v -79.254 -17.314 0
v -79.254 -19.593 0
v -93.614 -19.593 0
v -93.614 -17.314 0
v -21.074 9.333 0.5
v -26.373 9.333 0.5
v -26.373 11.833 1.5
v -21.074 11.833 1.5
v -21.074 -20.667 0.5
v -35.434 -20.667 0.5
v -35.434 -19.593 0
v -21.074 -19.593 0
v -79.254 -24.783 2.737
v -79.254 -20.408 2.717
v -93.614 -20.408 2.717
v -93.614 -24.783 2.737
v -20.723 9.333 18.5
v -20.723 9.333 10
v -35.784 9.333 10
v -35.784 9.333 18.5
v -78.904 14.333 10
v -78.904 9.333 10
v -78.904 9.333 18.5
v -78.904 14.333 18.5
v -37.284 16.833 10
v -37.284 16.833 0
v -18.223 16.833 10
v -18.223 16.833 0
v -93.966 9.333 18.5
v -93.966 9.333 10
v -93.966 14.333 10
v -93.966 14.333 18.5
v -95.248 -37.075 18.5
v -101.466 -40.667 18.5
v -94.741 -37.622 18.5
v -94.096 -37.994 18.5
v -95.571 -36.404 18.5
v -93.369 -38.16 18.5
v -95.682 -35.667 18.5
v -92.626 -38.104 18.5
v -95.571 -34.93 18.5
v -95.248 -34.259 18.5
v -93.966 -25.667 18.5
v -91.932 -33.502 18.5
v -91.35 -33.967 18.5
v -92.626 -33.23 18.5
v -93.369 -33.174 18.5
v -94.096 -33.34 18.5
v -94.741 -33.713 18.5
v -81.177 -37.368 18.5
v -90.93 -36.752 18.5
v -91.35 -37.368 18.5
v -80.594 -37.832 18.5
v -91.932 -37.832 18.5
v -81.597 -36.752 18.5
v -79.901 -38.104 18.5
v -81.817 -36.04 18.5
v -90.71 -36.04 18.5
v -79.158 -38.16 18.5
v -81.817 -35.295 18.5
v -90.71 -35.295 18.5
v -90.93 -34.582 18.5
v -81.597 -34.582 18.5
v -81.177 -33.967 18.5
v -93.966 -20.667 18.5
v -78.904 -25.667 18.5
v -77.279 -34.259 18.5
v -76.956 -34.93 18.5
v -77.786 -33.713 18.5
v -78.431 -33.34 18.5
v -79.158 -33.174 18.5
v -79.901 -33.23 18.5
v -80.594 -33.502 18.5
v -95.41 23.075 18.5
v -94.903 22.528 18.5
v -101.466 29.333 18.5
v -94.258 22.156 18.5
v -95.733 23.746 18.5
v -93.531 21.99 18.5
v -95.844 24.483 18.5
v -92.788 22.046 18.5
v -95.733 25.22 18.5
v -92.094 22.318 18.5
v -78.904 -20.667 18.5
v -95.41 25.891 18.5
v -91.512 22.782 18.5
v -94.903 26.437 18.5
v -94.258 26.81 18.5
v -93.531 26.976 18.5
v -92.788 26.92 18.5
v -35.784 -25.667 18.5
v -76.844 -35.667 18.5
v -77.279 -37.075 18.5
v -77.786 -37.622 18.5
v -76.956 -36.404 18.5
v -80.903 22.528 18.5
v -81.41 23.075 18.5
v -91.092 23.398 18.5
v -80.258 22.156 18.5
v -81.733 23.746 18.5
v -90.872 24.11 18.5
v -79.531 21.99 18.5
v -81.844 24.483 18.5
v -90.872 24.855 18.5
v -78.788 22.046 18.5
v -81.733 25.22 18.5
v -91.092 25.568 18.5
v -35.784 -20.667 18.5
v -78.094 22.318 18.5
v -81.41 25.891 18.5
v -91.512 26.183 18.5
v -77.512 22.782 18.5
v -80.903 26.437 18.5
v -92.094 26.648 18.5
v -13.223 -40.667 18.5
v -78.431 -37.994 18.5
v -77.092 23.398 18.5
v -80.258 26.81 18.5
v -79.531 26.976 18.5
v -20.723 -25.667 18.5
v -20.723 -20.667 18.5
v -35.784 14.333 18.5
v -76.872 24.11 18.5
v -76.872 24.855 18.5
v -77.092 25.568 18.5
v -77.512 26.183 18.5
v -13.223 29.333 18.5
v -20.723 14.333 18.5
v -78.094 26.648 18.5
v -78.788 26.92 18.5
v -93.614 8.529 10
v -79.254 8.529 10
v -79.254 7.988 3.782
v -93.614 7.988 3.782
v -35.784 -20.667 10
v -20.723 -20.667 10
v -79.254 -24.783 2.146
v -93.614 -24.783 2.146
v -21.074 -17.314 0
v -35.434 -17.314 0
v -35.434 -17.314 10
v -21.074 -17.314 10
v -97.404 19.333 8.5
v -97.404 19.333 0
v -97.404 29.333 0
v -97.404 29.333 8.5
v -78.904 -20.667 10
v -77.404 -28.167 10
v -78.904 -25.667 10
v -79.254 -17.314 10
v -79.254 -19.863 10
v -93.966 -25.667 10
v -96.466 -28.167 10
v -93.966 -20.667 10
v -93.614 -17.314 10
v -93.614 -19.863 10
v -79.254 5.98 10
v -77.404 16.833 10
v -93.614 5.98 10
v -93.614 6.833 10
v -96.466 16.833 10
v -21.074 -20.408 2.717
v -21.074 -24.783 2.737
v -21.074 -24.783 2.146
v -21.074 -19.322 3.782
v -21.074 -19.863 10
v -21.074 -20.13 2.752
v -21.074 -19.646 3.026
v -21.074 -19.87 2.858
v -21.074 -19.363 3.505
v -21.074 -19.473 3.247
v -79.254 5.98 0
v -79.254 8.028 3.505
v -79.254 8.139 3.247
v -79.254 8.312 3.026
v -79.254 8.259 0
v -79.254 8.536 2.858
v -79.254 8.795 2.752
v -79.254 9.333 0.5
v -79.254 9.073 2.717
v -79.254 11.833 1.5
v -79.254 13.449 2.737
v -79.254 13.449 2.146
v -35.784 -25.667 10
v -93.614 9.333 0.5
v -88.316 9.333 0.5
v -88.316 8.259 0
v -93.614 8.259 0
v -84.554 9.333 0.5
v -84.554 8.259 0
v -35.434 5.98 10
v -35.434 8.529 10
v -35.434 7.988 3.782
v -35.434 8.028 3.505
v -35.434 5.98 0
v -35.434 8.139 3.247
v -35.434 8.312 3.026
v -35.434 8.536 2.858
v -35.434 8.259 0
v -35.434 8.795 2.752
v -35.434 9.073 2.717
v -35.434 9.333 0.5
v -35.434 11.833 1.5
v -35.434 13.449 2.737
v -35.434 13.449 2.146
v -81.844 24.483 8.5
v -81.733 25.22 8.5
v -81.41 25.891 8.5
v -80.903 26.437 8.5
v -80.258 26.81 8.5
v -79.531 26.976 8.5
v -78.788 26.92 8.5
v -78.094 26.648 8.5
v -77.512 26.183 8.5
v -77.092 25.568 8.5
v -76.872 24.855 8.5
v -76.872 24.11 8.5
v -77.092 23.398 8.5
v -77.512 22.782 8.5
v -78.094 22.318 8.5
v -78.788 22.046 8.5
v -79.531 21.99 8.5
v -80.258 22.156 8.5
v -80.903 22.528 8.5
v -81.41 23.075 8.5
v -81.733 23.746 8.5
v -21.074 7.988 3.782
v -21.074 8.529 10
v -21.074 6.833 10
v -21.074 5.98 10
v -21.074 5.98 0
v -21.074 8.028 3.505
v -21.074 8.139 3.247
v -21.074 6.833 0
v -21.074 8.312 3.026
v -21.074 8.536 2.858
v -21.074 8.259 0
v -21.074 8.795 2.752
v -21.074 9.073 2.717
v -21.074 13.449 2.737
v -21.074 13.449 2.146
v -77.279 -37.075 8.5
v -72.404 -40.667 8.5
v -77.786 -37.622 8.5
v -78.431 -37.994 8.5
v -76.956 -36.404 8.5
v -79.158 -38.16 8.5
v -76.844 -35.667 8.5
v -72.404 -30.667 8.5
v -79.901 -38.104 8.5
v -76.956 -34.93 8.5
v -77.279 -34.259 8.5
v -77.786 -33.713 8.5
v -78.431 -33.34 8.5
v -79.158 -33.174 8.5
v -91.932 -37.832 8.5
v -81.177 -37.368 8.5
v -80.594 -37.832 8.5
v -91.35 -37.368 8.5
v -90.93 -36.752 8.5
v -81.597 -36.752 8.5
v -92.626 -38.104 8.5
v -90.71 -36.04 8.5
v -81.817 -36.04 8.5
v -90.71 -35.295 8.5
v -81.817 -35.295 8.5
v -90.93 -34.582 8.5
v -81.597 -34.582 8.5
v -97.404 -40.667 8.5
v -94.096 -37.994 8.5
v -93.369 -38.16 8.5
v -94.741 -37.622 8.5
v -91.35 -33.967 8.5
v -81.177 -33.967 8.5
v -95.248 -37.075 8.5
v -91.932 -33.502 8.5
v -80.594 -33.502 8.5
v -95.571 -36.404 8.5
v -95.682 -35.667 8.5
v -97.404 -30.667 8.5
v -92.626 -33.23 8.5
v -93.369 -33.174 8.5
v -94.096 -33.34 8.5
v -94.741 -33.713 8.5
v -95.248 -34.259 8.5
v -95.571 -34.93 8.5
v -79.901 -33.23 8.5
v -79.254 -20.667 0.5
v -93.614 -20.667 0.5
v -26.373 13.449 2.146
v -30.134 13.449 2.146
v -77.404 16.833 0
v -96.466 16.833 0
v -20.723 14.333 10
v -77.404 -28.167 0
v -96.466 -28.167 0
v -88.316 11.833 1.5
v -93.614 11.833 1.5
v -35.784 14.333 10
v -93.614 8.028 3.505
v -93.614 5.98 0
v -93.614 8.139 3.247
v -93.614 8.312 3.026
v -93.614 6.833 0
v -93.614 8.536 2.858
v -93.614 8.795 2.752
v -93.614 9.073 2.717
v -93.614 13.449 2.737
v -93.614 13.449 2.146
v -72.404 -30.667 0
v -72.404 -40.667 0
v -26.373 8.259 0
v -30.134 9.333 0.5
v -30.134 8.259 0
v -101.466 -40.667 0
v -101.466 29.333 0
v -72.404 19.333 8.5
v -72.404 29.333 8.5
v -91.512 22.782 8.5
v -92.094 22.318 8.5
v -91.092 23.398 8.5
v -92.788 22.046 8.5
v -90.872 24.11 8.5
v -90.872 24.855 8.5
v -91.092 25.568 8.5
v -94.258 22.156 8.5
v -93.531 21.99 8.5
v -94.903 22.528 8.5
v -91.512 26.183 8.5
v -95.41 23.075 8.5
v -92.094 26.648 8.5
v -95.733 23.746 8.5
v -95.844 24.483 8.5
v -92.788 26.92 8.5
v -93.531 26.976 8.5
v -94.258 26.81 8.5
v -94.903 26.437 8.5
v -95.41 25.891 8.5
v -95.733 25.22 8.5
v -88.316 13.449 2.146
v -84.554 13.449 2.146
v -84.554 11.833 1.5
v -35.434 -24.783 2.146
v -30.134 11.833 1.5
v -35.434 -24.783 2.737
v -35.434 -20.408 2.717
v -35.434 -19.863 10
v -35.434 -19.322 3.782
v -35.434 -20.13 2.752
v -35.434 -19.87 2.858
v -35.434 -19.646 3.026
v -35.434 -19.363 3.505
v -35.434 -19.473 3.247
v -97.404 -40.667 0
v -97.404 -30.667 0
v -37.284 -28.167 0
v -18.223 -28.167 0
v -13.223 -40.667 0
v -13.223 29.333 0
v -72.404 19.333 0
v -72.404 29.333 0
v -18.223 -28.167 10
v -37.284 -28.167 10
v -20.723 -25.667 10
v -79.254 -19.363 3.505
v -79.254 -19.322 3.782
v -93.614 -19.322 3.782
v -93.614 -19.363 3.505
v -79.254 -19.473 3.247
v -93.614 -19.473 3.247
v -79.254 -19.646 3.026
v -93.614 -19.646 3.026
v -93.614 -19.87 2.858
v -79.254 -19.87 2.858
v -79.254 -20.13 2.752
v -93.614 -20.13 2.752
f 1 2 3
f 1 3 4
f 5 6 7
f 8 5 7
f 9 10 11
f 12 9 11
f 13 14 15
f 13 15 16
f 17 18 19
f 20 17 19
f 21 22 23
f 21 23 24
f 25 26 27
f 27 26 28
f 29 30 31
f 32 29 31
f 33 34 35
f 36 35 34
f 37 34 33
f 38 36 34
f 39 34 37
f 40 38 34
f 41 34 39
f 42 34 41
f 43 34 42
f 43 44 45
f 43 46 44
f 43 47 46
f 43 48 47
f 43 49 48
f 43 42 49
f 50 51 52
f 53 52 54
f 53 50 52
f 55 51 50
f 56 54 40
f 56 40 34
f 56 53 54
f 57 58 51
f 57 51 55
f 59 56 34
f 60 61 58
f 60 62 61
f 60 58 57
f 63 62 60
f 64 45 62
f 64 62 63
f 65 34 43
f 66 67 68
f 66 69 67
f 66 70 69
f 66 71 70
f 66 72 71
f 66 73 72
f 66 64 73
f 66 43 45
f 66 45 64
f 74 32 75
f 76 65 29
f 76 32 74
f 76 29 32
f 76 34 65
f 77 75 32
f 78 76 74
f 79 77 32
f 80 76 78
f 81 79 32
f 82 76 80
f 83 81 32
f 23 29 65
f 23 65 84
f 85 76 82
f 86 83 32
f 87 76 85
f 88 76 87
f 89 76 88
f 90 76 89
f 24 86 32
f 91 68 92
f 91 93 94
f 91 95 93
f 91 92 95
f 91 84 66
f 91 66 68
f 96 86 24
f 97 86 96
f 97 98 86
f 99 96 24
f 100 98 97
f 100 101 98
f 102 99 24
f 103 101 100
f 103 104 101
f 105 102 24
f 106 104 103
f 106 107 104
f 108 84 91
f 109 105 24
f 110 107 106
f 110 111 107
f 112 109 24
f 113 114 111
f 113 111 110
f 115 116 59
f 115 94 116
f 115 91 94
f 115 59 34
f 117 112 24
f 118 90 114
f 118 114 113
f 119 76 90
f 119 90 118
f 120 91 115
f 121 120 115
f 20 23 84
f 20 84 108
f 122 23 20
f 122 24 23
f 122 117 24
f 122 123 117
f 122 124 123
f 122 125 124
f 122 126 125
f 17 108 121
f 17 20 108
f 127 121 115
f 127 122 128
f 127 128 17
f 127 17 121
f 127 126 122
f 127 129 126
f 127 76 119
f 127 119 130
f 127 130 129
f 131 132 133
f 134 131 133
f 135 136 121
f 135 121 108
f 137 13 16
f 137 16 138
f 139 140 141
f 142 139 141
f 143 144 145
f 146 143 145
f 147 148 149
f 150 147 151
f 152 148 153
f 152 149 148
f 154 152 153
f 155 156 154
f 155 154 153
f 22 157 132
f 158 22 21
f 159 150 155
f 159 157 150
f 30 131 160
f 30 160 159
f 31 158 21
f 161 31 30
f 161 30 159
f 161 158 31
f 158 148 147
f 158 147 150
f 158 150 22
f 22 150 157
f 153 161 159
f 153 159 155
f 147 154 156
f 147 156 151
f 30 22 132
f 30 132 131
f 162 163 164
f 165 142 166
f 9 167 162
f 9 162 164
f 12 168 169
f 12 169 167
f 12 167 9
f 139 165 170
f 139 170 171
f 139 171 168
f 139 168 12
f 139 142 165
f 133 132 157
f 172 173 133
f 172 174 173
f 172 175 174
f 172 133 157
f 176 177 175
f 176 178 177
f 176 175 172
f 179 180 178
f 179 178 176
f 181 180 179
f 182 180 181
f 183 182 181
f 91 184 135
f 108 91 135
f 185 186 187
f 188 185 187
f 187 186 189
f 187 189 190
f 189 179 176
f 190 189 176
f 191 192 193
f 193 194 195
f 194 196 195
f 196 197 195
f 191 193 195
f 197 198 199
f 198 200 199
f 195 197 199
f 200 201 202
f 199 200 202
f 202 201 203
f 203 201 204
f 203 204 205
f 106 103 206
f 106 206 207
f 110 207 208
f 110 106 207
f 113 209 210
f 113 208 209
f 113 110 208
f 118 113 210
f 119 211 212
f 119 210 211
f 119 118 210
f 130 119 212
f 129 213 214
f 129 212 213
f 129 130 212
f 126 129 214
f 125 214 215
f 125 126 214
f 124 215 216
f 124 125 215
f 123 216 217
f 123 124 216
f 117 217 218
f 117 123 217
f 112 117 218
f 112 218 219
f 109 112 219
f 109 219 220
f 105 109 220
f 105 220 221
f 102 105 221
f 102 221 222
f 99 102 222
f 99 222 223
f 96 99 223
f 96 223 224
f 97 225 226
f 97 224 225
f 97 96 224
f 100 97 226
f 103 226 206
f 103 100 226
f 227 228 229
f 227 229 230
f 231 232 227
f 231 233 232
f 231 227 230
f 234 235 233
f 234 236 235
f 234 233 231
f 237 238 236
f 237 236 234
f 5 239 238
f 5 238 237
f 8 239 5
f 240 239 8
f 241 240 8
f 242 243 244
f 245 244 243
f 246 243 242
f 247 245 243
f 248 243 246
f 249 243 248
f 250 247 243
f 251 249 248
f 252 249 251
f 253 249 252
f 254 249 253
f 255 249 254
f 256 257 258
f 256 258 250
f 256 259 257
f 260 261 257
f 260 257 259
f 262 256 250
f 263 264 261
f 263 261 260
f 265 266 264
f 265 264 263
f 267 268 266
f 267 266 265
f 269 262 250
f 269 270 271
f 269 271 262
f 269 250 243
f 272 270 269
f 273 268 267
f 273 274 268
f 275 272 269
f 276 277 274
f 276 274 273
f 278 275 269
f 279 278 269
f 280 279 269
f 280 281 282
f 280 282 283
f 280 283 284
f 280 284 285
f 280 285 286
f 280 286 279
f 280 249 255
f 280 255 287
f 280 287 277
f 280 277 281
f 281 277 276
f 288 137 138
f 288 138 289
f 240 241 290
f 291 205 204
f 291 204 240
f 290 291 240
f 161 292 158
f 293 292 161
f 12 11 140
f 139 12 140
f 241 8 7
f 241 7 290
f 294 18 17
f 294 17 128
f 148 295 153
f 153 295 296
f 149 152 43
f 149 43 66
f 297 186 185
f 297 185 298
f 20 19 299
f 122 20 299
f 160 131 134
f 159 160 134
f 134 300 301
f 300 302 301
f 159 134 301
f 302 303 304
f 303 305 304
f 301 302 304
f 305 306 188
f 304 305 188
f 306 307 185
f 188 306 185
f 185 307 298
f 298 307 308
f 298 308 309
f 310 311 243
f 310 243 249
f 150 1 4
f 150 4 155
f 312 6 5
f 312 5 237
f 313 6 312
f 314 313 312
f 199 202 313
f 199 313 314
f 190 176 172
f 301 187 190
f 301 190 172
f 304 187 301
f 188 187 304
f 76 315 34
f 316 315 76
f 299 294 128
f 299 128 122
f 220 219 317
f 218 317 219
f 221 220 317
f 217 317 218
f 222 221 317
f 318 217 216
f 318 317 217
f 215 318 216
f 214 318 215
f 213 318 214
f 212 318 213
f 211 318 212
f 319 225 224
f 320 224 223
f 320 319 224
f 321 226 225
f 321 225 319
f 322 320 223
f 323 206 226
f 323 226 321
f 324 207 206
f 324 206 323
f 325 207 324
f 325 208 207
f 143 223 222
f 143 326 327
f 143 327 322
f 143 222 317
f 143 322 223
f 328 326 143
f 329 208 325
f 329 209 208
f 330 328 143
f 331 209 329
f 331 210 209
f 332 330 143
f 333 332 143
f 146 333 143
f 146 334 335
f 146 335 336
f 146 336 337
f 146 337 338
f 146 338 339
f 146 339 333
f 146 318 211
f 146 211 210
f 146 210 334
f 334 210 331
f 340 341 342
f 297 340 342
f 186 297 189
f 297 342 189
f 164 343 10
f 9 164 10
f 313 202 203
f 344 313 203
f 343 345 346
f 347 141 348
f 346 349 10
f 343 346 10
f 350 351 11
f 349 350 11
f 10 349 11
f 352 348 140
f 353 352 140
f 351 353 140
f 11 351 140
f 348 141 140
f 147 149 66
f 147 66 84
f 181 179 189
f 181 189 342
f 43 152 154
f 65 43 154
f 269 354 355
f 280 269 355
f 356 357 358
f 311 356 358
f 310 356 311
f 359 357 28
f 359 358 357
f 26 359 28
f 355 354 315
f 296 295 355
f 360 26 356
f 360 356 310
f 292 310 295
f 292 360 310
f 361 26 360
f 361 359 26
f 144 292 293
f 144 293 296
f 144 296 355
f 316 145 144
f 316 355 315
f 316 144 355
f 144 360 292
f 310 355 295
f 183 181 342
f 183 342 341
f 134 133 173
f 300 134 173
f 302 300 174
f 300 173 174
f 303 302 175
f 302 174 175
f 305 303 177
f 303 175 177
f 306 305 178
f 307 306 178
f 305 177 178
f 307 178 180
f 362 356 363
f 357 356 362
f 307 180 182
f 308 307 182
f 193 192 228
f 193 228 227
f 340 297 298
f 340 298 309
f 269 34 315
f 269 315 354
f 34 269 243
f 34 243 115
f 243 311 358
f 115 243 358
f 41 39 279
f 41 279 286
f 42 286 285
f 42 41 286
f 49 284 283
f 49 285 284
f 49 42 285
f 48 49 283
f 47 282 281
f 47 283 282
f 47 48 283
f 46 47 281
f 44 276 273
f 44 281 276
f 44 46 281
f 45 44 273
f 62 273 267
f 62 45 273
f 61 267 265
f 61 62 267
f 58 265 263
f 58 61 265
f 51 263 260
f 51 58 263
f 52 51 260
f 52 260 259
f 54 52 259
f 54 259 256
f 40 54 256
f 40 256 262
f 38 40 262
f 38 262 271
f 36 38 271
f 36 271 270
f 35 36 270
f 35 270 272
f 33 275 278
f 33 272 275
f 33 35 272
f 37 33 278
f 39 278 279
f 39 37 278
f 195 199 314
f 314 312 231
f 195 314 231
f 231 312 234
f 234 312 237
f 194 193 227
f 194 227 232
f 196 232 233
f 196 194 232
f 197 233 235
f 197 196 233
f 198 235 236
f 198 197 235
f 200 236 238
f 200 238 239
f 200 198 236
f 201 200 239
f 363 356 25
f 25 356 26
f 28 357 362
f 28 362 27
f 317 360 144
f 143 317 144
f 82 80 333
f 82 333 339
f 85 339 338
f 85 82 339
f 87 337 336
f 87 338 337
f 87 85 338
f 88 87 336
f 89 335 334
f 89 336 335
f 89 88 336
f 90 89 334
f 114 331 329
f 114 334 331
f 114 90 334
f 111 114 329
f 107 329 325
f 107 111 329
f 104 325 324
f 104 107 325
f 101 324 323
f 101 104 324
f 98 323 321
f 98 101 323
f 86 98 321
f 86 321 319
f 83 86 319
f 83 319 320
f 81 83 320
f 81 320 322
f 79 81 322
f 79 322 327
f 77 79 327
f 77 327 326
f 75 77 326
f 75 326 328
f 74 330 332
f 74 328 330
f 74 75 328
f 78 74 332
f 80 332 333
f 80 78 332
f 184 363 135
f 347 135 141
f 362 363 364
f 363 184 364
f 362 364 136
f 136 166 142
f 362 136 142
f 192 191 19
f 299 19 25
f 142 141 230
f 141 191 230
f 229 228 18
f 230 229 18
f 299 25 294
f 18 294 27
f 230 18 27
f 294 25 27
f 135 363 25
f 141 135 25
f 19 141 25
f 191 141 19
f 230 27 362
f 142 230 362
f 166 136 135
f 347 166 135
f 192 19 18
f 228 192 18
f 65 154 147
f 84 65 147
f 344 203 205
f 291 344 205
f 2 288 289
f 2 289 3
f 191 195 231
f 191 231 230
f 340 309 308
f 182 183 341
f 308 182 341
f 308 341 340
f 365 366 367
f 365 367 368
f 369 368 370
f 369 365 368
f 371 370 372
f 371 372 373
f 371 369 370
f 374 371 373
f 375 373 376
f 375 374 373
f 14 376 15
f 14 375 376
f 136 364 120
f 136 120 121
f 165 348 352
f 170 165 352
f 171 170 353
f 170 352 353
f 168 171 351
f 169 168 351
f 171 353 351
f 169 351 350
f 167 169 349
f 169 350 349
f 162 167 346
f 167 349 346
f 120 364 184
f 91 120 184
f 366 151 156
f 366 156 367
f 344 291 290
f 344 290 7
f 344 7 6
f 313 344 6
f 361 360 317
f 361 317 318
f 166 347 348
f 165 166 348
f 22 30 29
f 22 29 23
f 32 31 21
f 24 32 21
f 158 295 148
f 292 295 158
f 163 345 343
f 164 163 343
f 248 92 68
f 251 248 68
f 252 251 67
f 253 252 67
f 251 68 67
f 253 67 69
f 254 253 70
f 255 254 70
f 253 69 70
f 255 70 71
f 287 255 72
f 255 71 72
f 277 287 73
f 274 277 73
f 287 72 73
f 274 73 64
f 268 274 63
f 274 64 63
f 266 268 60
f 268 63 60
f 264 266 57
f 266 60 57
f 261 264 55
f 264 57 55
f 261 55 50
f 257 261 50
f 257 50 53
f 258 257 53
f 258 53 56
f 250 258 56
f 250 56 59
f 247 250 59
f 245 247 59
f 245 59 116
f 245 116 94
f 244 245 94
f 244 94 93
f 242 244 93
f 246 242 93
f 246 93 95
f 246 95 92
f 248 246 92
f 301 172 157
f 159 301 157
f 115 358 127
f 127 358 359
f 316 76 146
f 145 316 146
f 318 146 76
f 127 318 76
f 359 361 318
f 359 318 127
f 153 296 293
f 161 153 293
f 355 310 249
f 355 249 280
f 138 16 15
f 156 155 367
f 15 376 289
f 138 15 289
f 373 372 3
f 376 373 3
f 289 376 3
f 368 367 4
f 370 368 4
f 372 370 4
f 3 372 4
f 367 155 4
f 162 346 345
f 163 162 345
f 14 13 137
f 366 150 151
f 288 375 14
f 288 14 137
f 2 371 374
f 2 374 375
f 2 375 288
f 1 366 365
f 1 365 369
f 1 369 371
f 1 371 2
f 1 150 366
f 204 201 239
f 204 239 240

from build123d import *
from build123d.topology import SkipClean

# Parameters (mm, degrees)
SKETCH1_W                = 90
SKETCH1_H                = 70
SKETCH1_W_2              = 20.06126988
SKETCH1_H_2              = 45
SKETCH1_W_3              = 19.93873012
BOSS_EXTRUDE2_DEPTH      = 10
SKETCH1_W_4              = 15.06126988
SKETCH1_H_3              = 40
BOSS_EXTRUDE2_2_DEPTH    = 10
SKETCH1_W_5              = 14.93873012
BOSS_EXTRUDE2_3_DEPTH    = 10
SKETCH2_W                = 90
SKETCH2_H                = 70
BOSS_EXTRUDE3_DEPTH      = 10
SKETCH4_W                = 1.5
SKETCH4_H                = 70
CUT_EXTRUDE2_DEPTH       = 100.5
SKETCH10_W               = 5
SKETCH10_H               = 70
CUT_EXTRUDE4_DEPTH       = 100.5
SKETCH11_W               = 6.5
SKETCH11_H               = 5
CUT_EXTRUDE5_DEPTH       = 100.5
SKETCH12_W               = 18.5
SKETCH12_H               = 70
BOSS_EXTRUDE5_DEPTH      = 5
SKETCH13_W               = 18.5
SKETCH13_H               = 70
BOSS_EXTRUDE6_DEPTH      = 5
SKETCH14_W               = 40
SKETCH14_H               = 45
BOSS_EXTRUDE7_DEPTH      = 11
SKETCH15_R               = 2.5
CUT_EXTRUDE6_DEPTH       = 3
SKETCH16_W               = 30
SKETCH16_H               = 66
CUT_EXTRUDE8_DEPTH       = 15.5
SKETCH17_W               = 14.93873012
SKETCH17_H               = 15
SKETCH17_W_2             = 15.06126988
CUT_EXTRUDE10_DEPTH      = 10
SKETCH18_W               = 14.93873012
SKETCH18_H               = 5
SKETCH18_W_2             = 15.06126988
CUT_EXTRUDE11_DEPTH      = 10
CUT_EXTRUDE12_DEPTH      = 10
SKETCH23_W               = 14.93873012
SKETCH23_H               = 40
SKETCH23_W_2             = 5.3
SKETCH23_H_2             = 39
SKETCH23_W_3             = 2.93873012
SKETCH23_W_4             = 3.06126988
CUT_EXTRUDE14_DEPTH      = 10
SKETCH28_W               = 18.5
SKETCH28_H               = 44.033892013
CUT_EXTRUDE15_DEPTH      = 6
CUT_EXTRUDE16_DEPTH      = 75
SKETCH30_W               = 18.5
SKETCH30_H               = 44.033892013
BOSS_EXTRUDE9_DEPTH      = 6
SKETCH31_W               = 1
SKETCH31_H               = 1.413045359
BOSS_EXTRUDE10_DEPTH     = 11
SKETCH32_W               = 8.246560308
SKETCH32_H               = 43.371701703
BOSS_EXTRUDE11_DEPTH     = 5
SKETCH33_W               = 8.811569605
SKETCH33_H               = 37.919451222
BOSS_EXTRUDE12_DEPTH     = 5
SKETCH34_W               = 59.93873012
SKETCH34_H               = 70
CUT_EXTRUDE18_DEPTH      = 37
SKETCH35_W               = 14.36126988
SKETCH35_H               = 2
CUT_EXTRUDE20_DEPTH      = 7
SKETCH36_W               = 5.3
SKETCH36_H               = 2
CUT_EXTRUDE21_DEPTH      = 10
SKETCH37_W               = 14.36126988
SKETCH37_H               = 1.5
CUT_EXTRUDE22_DEPTH      = 10
SKETCH38_W               = 1.5
SKETCH38_H               = 4
CUT_EXTRUDE23_DEPTH      = 15
CUT_EXTRUDE24_DEPTH      = 10
CUT_EXTRUDE24_DEPTH_BACK = 6
SKETCH39_W               = 1.5
SKETCH39_H               = 2
CUT_EXTRUDE26_DEPTH      = 10
CUT_EXTRUDE26_DEPTH_BACK = 6
SKETCH41_W               = 16.397713906
SKETCH41_H               = 51.423830598
CUT_EXTRUDE27_DEPTH      = 5
BOSS_EXTRUDE13_DEPTH     = 14.37
FILLET4_R                = 1
BOSS_EXTRUDE14_DEPTH     = 14.37
FILLET5_R                = 1
CUT_EXTRUDE28_DEPTH      = 14.37
SKETCH45_W               = 14.36126988
SKETCH45_H               = 1
CUT_EXTRUDE29_DEPTH      = 14.37
SKETCH46_W               = 5
SKETCH46_H               = 51.423830598
BOSS_EXTRUDE15_DEPTH     = 18.37
SKETCH48_W               = 15.404975863
SKETCH48_H               = 48.247068862
CUT_EXTRUDE30_DEPTH      = 6
BOSS_EXTRUDE19_DEPTH     = 14.36
CUT_EXTRUDE33_DEPTH      = 15.36
CUT_EXTRUDE34_DEPTH      = 15.36
SKETCH56_W               = 3.76126988
SKETCH56_H               = 3.574209709
CUT_EXTRUDE35_DEPTH      = 5.36
BOSS_EXTRUDE23_DEPTH     = 14.36
CUT_EXTRUDE39_DEPTH      = 14.36
SKETCH61_W               = 0.148623377
SKETCH61_H               = 7.599329431
CUT_EXTRUDE41_DEPTH      = 10
CUT_EXTRUDE42_DEPTH      = 16
BOSS_EXTRUDE24_DEPTH     = 14.36
SKETCH68_W               = 15.06
SKETCH68_H               = 70
BOSS_EXTRUDE28_DEPTH     = 18.5
SKETCH70_W               = 6
SKETCH70_H               = 48.247068862
BOSS_EXTRUDE29_DEPTH     = 18.5
SKETCH72_W               = 16.06
SKETCH72_H               = 66
CUT_EXTRUDE44_DEPTH      = 16.5
SKETCH75_W               = 1
SKETCH75_H               = 70
CUT_EXTRUDE45_DEPTH      = 33.5
SKETCH76_R               = 2.5
CUT_EXTRUDE46_DEPTH      = 33.5
CUT_EXTRUDE48_DEPTH      = 26
CUT_EXTRUDE48_DEPTH_BACK = 23
SKETCH77_R               = 2.5
SKETCH78_W               = 22.535153564
SKETCH78_H               = 70
BOSS_EXTRUDE30_DEPTH     = 2
SKETCH79_W               = 35.12
SKETCH79_H               = 45
BOSS_EXTRUDE31_DEPTH     = 16.5
SKETCH80_W               = 6
SKETCH80_H               = 45
CUT_EXTRUDE49_DEPTH      = 16.5
SKETCH81_W               = 30.12
SKETCH81_H               = 66
BOSS_EXTRUDE33_DEPTH     = 16.5
SKETCH83_W               = 25
SKETCH83_H               = 10
CUT_EXTRUDE50_DEPTH      = 8.5
SKETCH84_R               = 2.5
CUT_EXTRUDE51_DEPTH      = 18.5


with BuildPart() as part:
    # Sketch1 → Boss-Extrude2 (new body)
    with BuildSketch(Plane.XY):
        with Locations((1.715542522, -5.667155425)):
            Rectangle(SKETCH1_W, SKETCH1_H)
        with Locations((-28.253822538, -5.667155425)):
            Rectangle(SKETCH1_W_2, SKETCH1_H_2, mode=Mode.SUBTRACT)
        with Locations((31.746177462, -5.667155425)):
            Rectangle(SKETCH1_W_3, SKETCH1_H_2, mode=Mode.SUBTRACT)
    extrude(amount=BOSS_EXTRUDE2_DEPTH)



with BuildPart() as body_2:
    # Sketch1 → Boss-Extrude2 2 (new body)
    with BuildSketch(Plane.XY):
        with Locations((-28.253822538, -5.667155425)):
            Rectangle(SKETCH1_W_4, SKETCH1_H_3)
    extrude(amount=BOSS_EXTRUDE2_2_DEPTH)


with BuildPart() as body_3:
    # Sketch1 → Boss-Extrude2 3 (new body)
    with BuildSketch(Plane.XY):
        with Locations((31.746177462, -5.667155425)):
            Rectangle(SKETCH1_W_5, SKETCH1_H_3)
    extrude(amount=BOSS_EXTRUDE2_3_DEPTH)


with BuildPart() as part_1:
    add(part.part)

    add(body_2.part)  # Boss-Extrude3 merges body 2

    add(body_3.part)  # Boss-Extrude3 merges body 3
    # Sketch2 → Boss-Extrude3 (add)
    with BuildSketch(Plane.XY.offset(10)):
        with Locations((1.715542522, -5.667155425)):
            Rectangle(SKETCH2_W, SKETCH2_H)
    extrude(amount=BOSS_EXTRUDE3_DEPTH)

    # Sketch4 → Cut-Extrude2 (cut)
    with BuildSketch(Plane.ZY.offset(43.284457478)):
        with Locations((19.25, -5.667155425)):
            Rectangle(SKETCH4_W, SKETCH4_H)
    extrude(amount=-CUT_EXTRUDE2_DEPTH, mode=Mode.SUBTRACT)

    # Sketch10 → Cut-Extrude4 (cut)
    with BuildSketch(Plane(origin=(0, 0, 0), x_dir=(-1, 0, 0), z_dir=(0, 0, -1))):
        with Locations((40.784457478, -5.667155425)):
            Rectangle(SKETCH10_W, SKETCH10_H)
        with Locations((-44.215542522, -5.667155425)):
            Rectangle(SKETCH10_W, SKETCH10_H)
    extrude(amount=-CUT_EXTRUDE4_DEPTH, mode=Mode.SUBTRACT)

    # Sketch11 → Cut-Extrude5 (cut)
    with BuildSketch(Plane.ZY.offset(35.784457478)):
        with Locations((6.75, 11.832844575)):
            Rectangle(SKETCH11_W, SKETCH11_H)
        Polygon((0, 9.332844575), (2, 14.332844575), (0, 14.332844575), align=None)
        Polygon((2, -25.667155425), (0, -20.667155425), (0, -25.667155425), align=None)
        with Locations((6.75, -23.167155425)):
            Rectangle(SKETCH11_W, SKETCH11_H)
    extrude(amount=-CUT_EXTRUDE5_DEPTH, mode=Mode.SUBTRACT)

    # Sketch12 → Boss-Extrude5 (add)
    with BuildSketch(Plane(origin=(41.715542522, 0, 0), x_dir=(0, 0, -1), z_dir=(1, 0, 0))):
        with Locations((-9.25, -5.667155425)):
            Rectangle(SKETCH12_W, SKETCH12_H)
    extrude(amount=BOSS_EXTRUDE5_DEPTH)

    # Sketch13 → Boss-Extrude6 (add)
    with BuildSketch(Plane.ZY.offset(38.284457478)):
        with Locations((9.25, -5.667155425)):
            Rectangle(SKETCH13_W, SKETCH13_H)
    extrude(amount=BOSS_EXTRUDE6_DEPTH)

    # Sketch14 → Boss-Extrude7 (add)
    with BuildSketch(Plane(origin=(0, 0, 0), x_dir=(-1, 0, 0), z_dir=(0, 0, -1))):
        with Locations((-1.776812402, -5.667155425)):
            Rectangle(SKETCH14_W, SKETCH14_H)
    extrude(amount=-BOSS_EXTRUDE7_DEPTH)

    # Sketch15 → Cut-Extrude6 (cut)
    with BuildSketch(Plane.XY.offset(18.5)):
        with Locations((8.715542522, 24.482844575)):
            Circle(SKETCH15_R)
        with Locations((-5.284457478, 24.482844575)):
            Circle(SKETCH15_R)
        with Locations((1.715542522, -35.667155425)):
            Circle(SKETCH15_R)
    extrude(amount=-CUT_EXTRUDE6_DEPTH, mode=Mode.SUBTRACT)

    # Sketch16 → Cut-Extrude8 (cut)
    with BuildSketch(Plane(origin=(0, 0, 0), x_dir=(-1, 0, 0), z_dir=(0, 0, -1))):
        with Locations((-1.776812402, -5.667155425)):
            Rectangle(SKETCH16_W, SKETCH16_H)
    extrude(amount=-CUT_EXTRUDE8_DEPTH, mode=Mode.SUBTRACT)

    # Sketch17 → Cut-Extrude10 (cut)
    with BuildSketch(Plane(origin=(0, 0, 0), x_dir=(-1, 0, 0), z_dir=(0, 0, -1))):
        with Locations((-31.746177462, -5.667155425)):
            Rectangle(SKETCH17_W, SKETCH17_H)
        with Locations((28.253822538, -5.667155425)):
            Rectangle(SKETCH17_W_2, SKETCH17_H)
    extrude(amount=-CUT_EXTRUDE10_DEPTH, mode=Mode.SUBTRACT)

    # Sketch18 → Cut-Extrude11 (cut)
    with BuildSketch(Plane(origin=(0, 0, 10), x_dir=(-1, 0, 0), z_dir=(0, 0, -1))):
        with Locations((-31.746177462, 11.832844575)):
            Rectangle(SKETCH18_W, SKETCH18_H)
        with Locations((-31.746177462, -23.167155425)):
            Rectangle(SKETCH18_W, SKETCH18_H)
        with Locations((28.253822538, -23.167155425)):
            Rectangle(SKETCH18_W_2, SKETCH18_H)
        with Locations((28.253822538, 11.832844575)):
            Rectangle(SKETCH18_W_2, SKETCH18_H)
    extrude(amount=-CUT_EXTRUDE11_DEPTH, mode=Mode.SUBTRACT)

    # Sketch19 → Cut-Extrude12 (cut)
    with BuildSketch(Plane(origin=(0, 0, 0), x_dir=(-1, 0, 0), z_dir=(0, 0, -1))):
        Polygon((-30.276812402, 14.332844575), (-33.215542522, 14.332844575), (-33.215542522, 4.832844575), (-39.215542522, 4.832844575), (-39.215542522, 1.832844575), (-24.276812402, 1.832844575), (-24.276812402, 4.832844575), (-30.276812402, 4.832844575), align=None)
        Polygon((20.723187598, 4.832844575), (20.723187598, 1.832844575), (35.784457478, 1.832844575), (35.784457478, 4.832844575), (29.784457478, 4.832844575), (29.784457478, 14.332844575), (26.723187598, 14.332844575), (26.723187598, 4.832844575), align=None)
        Polygon((20.723187598, -13.167155425), (20.723187598, -16.167155425), (26.723187598, -16.167155425), (26.723187598, -25.667155425), (29.784457478, -25.667155425), (29.784457478, -16.167155425), (35.784457478, -16.167155425), (35.784457478, -13.167155425), align=None)
        Polygon((-39.215542522, -13.167155425), (-39.215542522, -16.167155425), (-33.215542522, -16.167155425), (-33.215542522, -25.667155425), (-30.276812402, -25.667155425), (-30.276812402, -16.167155425), (-24.276812402, -16.167155425), (-24.276812402, -13.167155425), align=None)
    extrude(amount=-CUT_EXTRUDE12_DEPTH, mode=Mode.SUBTRACT)

    # Sketch23 → Cut-Extrude14 (cut)
    # profile 1 of 2: a face of its own
    with BuildSketch(Plane(origin=(0, 0, 0), x_dir=(-1, 0, 0), z_dir=(0, 0, -1))):
        with Locations((-31.746177462, -5.667155425)):
            Rectangle(SKETCH23_W, SKETCH23_H)
        with Locations((-36.215542522, -5.667155425)):
            Rectangle(SKETCH23_W_2, SKETCH23_H_2, mode=Mode.SUBTRACT)
        with Locations((-31.746177462, -5.667155425)):
            Rectangle(SKETCH23_W_3, SKETCH23_H_2, mode=Mode.SUBTRACT)
        with Locations((-27.276812402, -5.667155425)):
            Rectangle(SKETCH23_W_2, SKETCH23_H_2, mode=Mode.SUBTRACT)
    # profile 2 of 2: a face of its own
    with BuildSketch(Plane(origin=(0, 0, 0), x_dir=(-1, 0, 0), z_dir=(0, 0, -1))):
        Polygon((20.723187598, 13.832844575), (20.723187598, -25.667155425), (35.784457478, -25.667155425), (35.784457478, 14.332844575), (20.723187598, 14.332844575), align=None)
        with Locations((23.723187598, -5.667155425)):
            Rectangle(SKETCH23_W_2, SKETCH23_H_2, mode=Mode.SUBTRACT)
        with Locations((28.253822538, -5.667155425)):
            Rectangle(SKETCH23_W_4, SKETCH23_H_2, mode=Mode.SUBTRACT)
        with Locations((32.784457478, -5.667155425)):
            Rectangle(SKETCH23_W_2, SKETCH23_H_2, mode=Mode.SUBTRACT)
    extrude(amount=-CUT_EXTRUDE14_DEPTH, mode=Mode.SUBTRACT)

    # Sketch28 → Cut-Extrude15 (cut)
    with BuildSketch(Plane(origin=(46.715542522, 0, 0), x_dir=(0, 0, -1), z_dir=(1, 0, 0))):
        with Locations((-9.25, -5.184101432)):
            Rectangle(SKETCH28_W, SKETCH28_H)
    extrude(amount=-CUT_EXTRUDE15_DEPTH, mode=Mode.SUBTRACT)

    # Sketch29 → Cut-Extrude16 (cut)
    with BuildSketch(Plane(origin=(38.865542522, 0, 0), x_dir=(0, 0, -1), z_dir=(1, 0, 0))):
        Polygon((-3.5, 9.332844575), (-3.5, 7.724451309), (-5, 7.536386318), (-10, 8.528647942), (-10, 9.332844575), align=None)
        Polygon((-10, -19.862958792), (-10, -20.667155425), (-3.5, -20.667155425), (-3.5, -19.058762159), (-5, -18.870697169), align=None)
    extrude(amount=-CUT_EXTRUDE16_DEPTH, mode=Mode.SUBTRACT)

    # Sketch30 → Boss-Extrude9 (add)
    with BuildSketch(Plane(origin=(46.715542522, 0, 0), x_dir=(0, 0, -1), z_dir=(1, 0, 0))):
        with Locations((-9.25, -5.184101432)):
            Rectangle(SKETCH30_W, SKETCH30_H)
    extrude(amount=-BOSS_EXTRUDE9_DEPTH)

    # Sketch31 → Boss-Extrude10 (add)
    with BuildSketch(Plane(origin=(0, 0, 0), x_dir=(-1, 0, 0), z_dir=(0, 0, -1))):
        with Locations((-41.215542522, -27.907570118)):
            Rectangle(SKETCH31_W, SKETCH31_H)
    extrude(amount=-BOSS_EXTRUDE10_DEPTH)

    # Sketch32 → Boss-Extrude11 (add)
    with BuildSketch(Plane(origin=(21.776812402, 0, 0), x_dir=(0, 0, -1), z_dir=(1, 0, 0))):
        with Locations((-5.876719846, -6.481304574)):
            Rectangle(SKETCH32_W, SKETCH32_H)
    extrude(amount=-BOSS_EXTRUDE11_DEPTH)

    # Sketch33 → Boss-Extrude12 (add)
    with BuildSketch(Plane(origin=(-13.223187598, 0, 0), x_dir=(0, 0, -1), z_dir=(1, 0, 0))):
        with Locations((-7.016962477, -6.558213026)):
            Rectangle(SKETCH33_W, SKETCH33_H)
    extrude(amount=-BOSS_EXTRUDE12_DEPTH)

    # Sketch34 → Cut-Extrude18 (cut)
    with BuildSketch(Plane(origin=(0, 0, 0), x_dir=(-1, 0, 0), z_dir=(0, 0, -1))):
        with Locations((-16.746177462, -5.667155425)):
            Rectangle(SKETCH34_W, SKETCH34_H)
    extrude(amount=-CUT_EXTRUDE18_DEPTH, mode=Mode.SUBTRACT)

    # Sketch35 → Cut-Extrude20 (cut)
    with BuildSketch(Plane(origin=(0, 0, 0), x_dir=(-1, 0, 0), z_dir=(0, 0, -1))):
        with Locations((28.253822538, 12.832844575)):
            Rectangle(SKETCH35_W, SKETCH35_H)
    extrude(amount=-CUT_EXTRUDE20_DEPTH, mode=Mode.SUBTRACT)

    # Sketch36 → Cut-Extrude21 (cut)
    with BuildSketch(Plane(origin=(0, 0, 0), x_dir=(-1, 0, 0), z_dir=(0, 0, -1))):
        with Locations((23.723187598, 5.832844575)):
            Rectangle(SKETCH36_W, SKETCH36_H)
        with Locations((32.784457478, 5.832844575)):
            Rectangle(SKETCH36_W, SKETCH36_H)
    extrude(amount=-CUT_EXTRUDE21_DEPTH, mode=Mode.SUBTRACT)

    # Sketch37 → Cut-Extrude22 (cut)
    with BuildSketch(Plane(origin=(0, 0, 0), x_dir=(-1, 0, 0), z_dir=(0, 0, -1))):
        with Locations((28.253822538, -16.917155425)):
            Rectangle(SKETCH37_W, SKETCH37_H)
    extrude(amount=-CUT_EXTRUDE22_DEPTH, mode=Mode.SUBTRACT)

    # Sketch38 → Cut-Extrude23 (cut)
    with BuildSketch(Plane(origin=(-21.073187598, 0, 0), x_dir=(0, 0, -1), z_dir=(1, 0, 0))):
        with Locations((-2.75, 9.832844575)):
            Rectangle(SKETCH38_W, SKETCH38_H)
    extrude(amount=-CUT_EXTRUDE23_DEPTH, mode=Mode.SUBTRACT)

    # Sketch39 → Cut-Extrude24 (cut, two sides: drawn at the far end of the back side and taken through both)
    with BuildSketch(Plane(origin=(-30.134457478, 0, 0), x_dir=(0, 0, -1), z_dir=(1, 0, 0)).offset(-CUT_EXTRUDE24_DEPTH_BACK)):
        with Locations((-2.75, -20.058762159)):
            Rectangle(SKETCH39_W, SKETCH39_H)
    extrude(amount=CUT_EXTRUDE24_DEPTH + CUT_EXTRUDE24_DEPTH_BACK, mode=Mode.SUBTRACT)

    # Sketch40 → Cut-Extrude26 (cut, two sides: drawn at the far end of the back side and taken through both)
    with BuildSketch(Plane.ZY.offset(26.373187598).offset(-CUT_EXTRUDE26_DEPTH_BACK)):
        Polygon((2, -21.058762159), (3.5, -22.496291026), (3.5, -21.058762159), align=None)
    extrude(amount=CUT_EXTRUDE26_DEPTH + CUT_EXTRUDE26_DEPTH_BACK, mode=Mode.SUBTRACT)

    # Sketch41 → Cut-Extrude27 (cut)
    with BuildSketch(Plane.ZY.offset(43.284457478)):
        with Locations((8.198856953, -6.213161349)):
            Rectangle(SKETCH41_W, SKETCH41_H)
    extrude(amount=-CUT_EXTRUDE27_DEPTH, mode=Mode.SUBTRACT)

    # Sketch42 → Boss-Extrude13 (add)
    with BuildSketch(Plane.ZY.offset(35.434457478)):
        Polygon((10, 8.528647942), (2, 7.832844575), (2, 6.832844575), (10, 6.832844575), align=None)
    extrude(amount=-BOSS_EXTRUDE13_DEPTH)

    # Fillet4
    fillet4_edges = [part_1.edges().sort_by_distance(p)[0] for p in [
        (-23.723187598, 7.832844575, 2),
        (-32.784457478, 7.832844575, 2),
    ]]
    fillet(fillet4_edges, radius=FILLET4_R)

    # Sketch43 → Boss-Extrude14 (add)
    with BuildSketch(Plane.ZY.offset(35.434457478)):
        Polygon((10, -17.667155425), (10, -19.862958792), (2, -19.058762159), (2, -17.667155425), align=None)
    extrude(amount=-BOSS_EXTRUDE14_DEPTH)

    # Fillet5
    fillet5_edges = [part_1.edges().sort_by_distance(p)[0] for p in [
        (-23.723187598, -19.058762159, 2),
        (-32.784457478, -19.058762159, 2),
    ]]
    fillet(fillet5_edges, radius=FILLET5_R)

    # Sketch44 → Cut-Extrude28 (cut)
    with BuildSketch(Plane.ZY.offset(35.434457478)):
        Polygon((3.5, -25.167155425), (2.65, -25.167155425), (2.75, -21.777526593), (3.5, -22.496291026), align=None)
    extrude(amount=-CUT_EXTRUDE28_DEPTH, mode=Mode.SUBTRACT)

    # Sketch45 → Cut-Extrude29 (cut)
    with BuildSketch(Plane(origin=(0, 0, 0), x_dir=(-1, 0, 0), z_dir=(0, 0, -1))):
        with Locations((28.253822538, -24.667155425)):
            Rectangle(SKETCH45_W, SKETCH45_H)
    extrude(amount=-CUT_EXTRUDE29_DEPTH, mode=Mode.SUBTRACT)

    # Sketch46 → Boss-Extrude15 (add)
    with BuildSketch(Plane(origin=(0, 0, 0), x_dir=(-1, 0, 0), z_dir=(0, 0, -1))):
        with Locations((40.784457478, -6.213161349)):
            Rectangle(SKETCH46_W, SKETCH46_H)
    extrude(amount=-BOSS_EXTRUDE15_DEPTH)

    # Sketch48 → Cut-Extrude30 (cut)
    with BuildSketch(Plane.ZY.offset(43.284457478)):
        with Locations((7.702487932, -6.312435153)):
            Rectangle(SKETCH48_W, SKETCH48_H)
    extrude(amount=-CUT_EXTRUDE30_DEPTH, mode=Mode.SUBTRACT)

    # Sketch52 → Boss-Extrude19 (add)
    with BuildSketch(Plane.ZY.offset(35.434457478)):
        with BuildLine():
            Line((10, 8.528647942), (3.782211541, 7.987853174))
            ThreePointArc((3.782211541, 7.987853174), (2.993551961, 8.279394923), (2.717099882, 9.073469714))
            Line((2.717099882, 9.073469714), (2.717099882, 11.832427917))
            Line((2.717099882, 11.832427917), (1.5, 11.832844575))
            Line((1.5, 11.832844575), (0, 8.279394923))
            Line((0, 8.279394923), (0, 5.979658876))
            Line((0, 5.979658876), (10, 5.979658876))
            Line((10, 5.979658876), (10, 8.528647942))
        make_face()
    extrude(amount=-BOSS_EXTRUDE19_DEPTH)

    # Sketch53 → Cut-Extrude33 (cut)
    with BuildSketch(Plane.ZY.offset(35.434457478)):
        Polygon((0, 9.332844575), (0.5, 9.332844575), (1.5, 11.832844575), (1, 11.832844575), align=None)
    extrude(amount=-CUT_EXTRUDE33_DEPTH, mode=Mode.SUBTRACT)

    # Sketch55 → Cut-Extrude34 (cut)
    with BuildSketch(Plane.ZY.offset(35.434457478)):
        Polygon((0.5, 9.332844575), (0, 8.258634866), (0, 9.332844575), align=None)
    extrude(amount=-CUT_EXTRUDE34_DEPTH, mode=Mode.SUBTRACT)

    # Sketch56 → Cut-Extrude35 (cut)
    with BuildSketch(Plane(origin=(0, 0, 0), x_dir=(-1, 0, 0), z_dir=(0, 0, -1))):
        with Locations((28.253822538, 10.045739721)):
            Rectangle(SKETCH56_W, SKETCH56_H)
    extrude(amount=-CUT_EXTRUDE35_DEPTH, mode=Mode.SUBTRACT)

    # Sketch58 → Boss-Extrude23 (add)
    with BuildSketch(Plane.ZY.offset(35.434457478)):
        Polygon((1.5, 11.832844575), (2.146438787, 13.448941543), (2.736734348, 13.448941543), (2.717099882, 11.832427917), align=None)
    extrude(amount=-BOSS_EXTRUDE23_DEPTH)

    # Sketch59 → Cut-Extrude39 (cut)
    with BuildSketch(Plane(origin=(0, 0, 0), x_dir=(-1, 0, 0), z_dir=(0, 0, -1))):
        Polygon((26.373187598, 13.448941543), (26.373187598, 11.832844575), (26.373187598, 11.431091881), (30.134457478, 11.431091881), (30.134457478, 11.832844575), (30.134457478, 13.448941543), (30.134457478, 13.829263242), (26.373187598, 13.829263242), align=None)
    extrude(amount=-CUT_EXTRUDE39_DEPTH, mode=Mode.SUBTRACT)

    # Sketch61 → Cut-Extrude41 (cut)
    with BuildSketch(Plane(origin=(0, 0, 0), x_dir=(-1, 0, 0), z_dir=(0, 0, -1))):
        with Locations((21.00014579, 9.779323592)):
            Rectangle(SKETCH61_W, SKETCH61_H)
    extrude(amount=-CUT_EXTRUDE41_DEPTH, mode=Mode.SUBTRACT)

    # Sketch62 → Cut-Extrude42 (cut)
    with BuildSketch(Plane.ZY.offset(35.434457478)):
        Polygon((10, -17.667155425), (0, -17.667155425), (0, -20.667155425), (1.4, -24.167155425), (2.679501755, -24.167155425), (2.75, -21.777526593), (10, -19.862958792), align=None)
    extrude(amount=-CUT_EXTRUDE42_DEPTH, mode=Mode.SUBTRACT)

    # Sketch65 → Boss-Extrude24 (add)
    with BuildSketch(Plane.ZY.offset(35.434457478)):
        with BuildLine():
            Line((0, 8.258634866), (0, 5.979658876))
            Line((0, 5.979658876), (10, 5.979658876))
            Line((10, 5.979658876), (10, 8.528647942))
            Line((10, 8.528647942), (3.782211541, 7.987853174))
            ThreePointArc((3.782211541, 7.987853174), (3.026420054, 8.311642211), (2.717099882, 9.073469714))
            Line((2.717099882, 9.073469714), (2.736734348, 13.448941543))
            Line((2.736734348, 13.448941543), (2.146438787, 13.448941543))
            Line((2.146438787, 13.448941543), (0.5, 9.332844575))
            Line((0.5, 9.332844575), (0, 8.258634866))
        make_face()
        with BuildLine():
            Line((10, -17.313969726), (10, -19.862958792))
            Line((10, -19.862958792), (3.782211541, -19.322164024))
            ThreePointArc((3.782211541, -19.322164024), (3.026420054, -19.645953062), (2.717099882, -20.407780564))
            Line((2.717099882, -20.407780564), (2.736734348, -24.783252393))
            Line((2.736734348, -24.783252393), (2.146438787, -24.783252393))
            Line((2.146438787, -24.783252393), (0.5, -20.667155425))
            Line((0.5, -20.667155425), (0, -19.592945716))
            Line((0, -19.592945716), (0, -17.313969726))
            Line((0, -17.313969726), (10, -17.313969726))
        make_face()
    extrude(amount=-BOSS_EXTRUDE24_DEPTH)

    # Sketch68 → Boss-Extrude28 (add)
    with BuildSketch(Plane(origin=(0, 0, 0), x_dir=(-1, 0, 0), z_dir=(0, 0, -1))):
        with Locations((50.814457478, -5.667155425)):
            Rectangle(SKETCH68_W, SKETCH68_H)
    extrude(amount=-BOSS_EXTRUDE28_DEPTH)

    # Sketch70 → Boss-Extrude29 (add)
    with BuildSketch(Plane(origin=(0, 0, 0), x_dir=(-1, 0, 0), z_dir=(0, 0, -1))):
        with Locations((40.284457478, -6.312435153)):
            Rectangle(SKETCH70_W, SKETCH70_H)
    extrude(amount=-BOSS_EXTRUDE29_DEPTH)

    # Sketch72 → Cut-Extrude44 (cut)
    with BuildSketch(Plane(origin=(0, 0, 0), x_dir=(-1, 0, 0), z_dir=(0, 0, -1))):
        with Locations((50.314457478, -5.667155425)):
            Rectangle(SKETCH72_W, SKETCH72_H)
    extrude(amount=-CUT_EXTRUDE44_DEPTH, mode=Mode.SUBTRACT)

    # Sketch75 → Cut-Extrude45 (cut)
    with BuildSketch(Plane(origin=(0, 0, 0), x_dir=(-1, 0, 0), z_dir=(0, 0, -1))):
        with Locations((57.844457478, -5.667155425)):
            Rectangle(SKETCH75_W, SKETCH75_H)
    extrude(amount=-CUT_EXTRUDE45_DEPTH, mode=Mode.SUBTRACT)

    # Sketch76 → Cut-Extrude46 (cut)
    with BuildSketch(Plane(origin=(0, 0, 16.5), x_dir=(-1, 0, 0), z_dir=(0, 0, -1))):
        with Locations((50.344457478, 24.482844575)):
            Circle(SKETCH76_R)
        with Locations((57.344457478, -35.667155425)):
            Circle(SKETCH76_R)
    extrude(amount=-CUT_EXTRUDE46_DEPTH, mode=Mode.SUBTRACT)

    # Mirror15: part across plane


with BuildPart() as part_2:
    with SkipClean():  # the faces are left unmerged after this step: merging them gives an invalid solid
        add(part_1.part)
        add(part_1.part.mirror(Plane(origin=(-57.344457478, -40.667155425, 33.5), x_dir=(0, 0, 1), z_dir=(1, 0, 0))))

    # Sketch77 → Cut-Extrude48 (cut, two sides: drawn at the far end of the back side and taken through both)
    with SkipClean():  # the faces are left unmerged after this step: merging them gives an invalid solid
        with BuildSketch(Plane(origin=(0, 0, 16.5), x_dir=(-1, 0, 0), z_dir=(0, 0, -1)).offset(-CUT_EXTRUDE48_DEPTH_BACK)):
            with Locations((79.344457478, 24.482844575)):
                Circle(SKETCH77_R)
            with Locations((93.344457478, 24.482844575)):
                Circle(SKETCH77_R)
            with Locations((93.18230081, -35.667155425)):
                Circle(SKETCH77_R)
        extrude(amount=CUT_EXTRUDE48_DEPTH + CUT_EXTRUDE48_DEPTH_BACK, mode=Mode.SUBTRACT)

    # Sketch78 → Boss-Extrude30 (add)
    with BuildSketch(Plane.XY.offset(18.5)):
        with Locations((-56.897725359, -5.667155425)):
            Rectangle(SKETCH78_W, SKETCH78_H)
    extrude(amount=-BOSS_EXTRUDE30_DEPTH)

    # Sketch79 → Boss-Extrude31 (add)
    with BuildSketch(Plane(origin=(0, 0, 16.5), x_dir=(-1, 0, 0), z_dir=(0, 0, -1))):
        with Locations((59.844457478, -5.667155425)):
            Rectangle(SKETCH79_W, SKETCH79_H)
    extrude(amount=BOSS_EXTRUDE31_DEPTH)

    # Sketch80 → Cut-Extrude49 (cut)
    with BuildSketch(Plane(origin=(0, 0, 0), x_dir=(-1, 0, 0), z_dir=(0, 0, -1))):
        with Locations((45.284457478, -5.667155425)):
            Rectangle(SKETCH80_W, SKETCH80_H)
        with Locations((69.404457478, -5.667155425)):
            Rectangle(SKETCH80_W, SKETCH80_H)
    extrude(amount=-CUT_EXTRUDE49_DEPTH, mode=Mode.SUBTRACT)

    # Sketch81 → Boss-Extrude33 (add)
    with BuildSketch(Plane(origin=(0, 0, 16.5), x_dir=(-1, 0, 0), z_dir=(0, 0, -1))):
        with Locations((57.344457478, -5.667155425)):
            Rectangle(SKETCH81_W, SKETCH81_H)
    extrude(amount=BOSS_EXTRUDE33_DEPTH)

    # Sketch83 → Cut-Extrude50 (cut)
    with BuildSketch(Plane(origin=(0, 0, 0), x_dir=(-1, 0, 0), z_dir=(0, 0, -1))):
        with Locations((84.904457478, 24.332844575)):
            Rectangle(SKETCH83_W, SKETCH83_H)
        with Locations((84.904457478, -35.667155425)):
            Rectangle(SKETCH83_W, SKETCH83_H)
    extrude(amount=-CUT_EXTRUDE50_DEPTH, mode=Mode.SUBTRACT)

    # Sketch84 → Cut-Extrude51 (cut)
    with BuildSketch(Plane.XY.offset(18.5)):
        with Locations((-79.344457478, -35.667155425)):
            Circle(SKETCH84_R)
    extrude(amount=-CUT_EXTRUDE51_DEPTH, mode=Mode.SUBTRACT)


solid = part_2.part
